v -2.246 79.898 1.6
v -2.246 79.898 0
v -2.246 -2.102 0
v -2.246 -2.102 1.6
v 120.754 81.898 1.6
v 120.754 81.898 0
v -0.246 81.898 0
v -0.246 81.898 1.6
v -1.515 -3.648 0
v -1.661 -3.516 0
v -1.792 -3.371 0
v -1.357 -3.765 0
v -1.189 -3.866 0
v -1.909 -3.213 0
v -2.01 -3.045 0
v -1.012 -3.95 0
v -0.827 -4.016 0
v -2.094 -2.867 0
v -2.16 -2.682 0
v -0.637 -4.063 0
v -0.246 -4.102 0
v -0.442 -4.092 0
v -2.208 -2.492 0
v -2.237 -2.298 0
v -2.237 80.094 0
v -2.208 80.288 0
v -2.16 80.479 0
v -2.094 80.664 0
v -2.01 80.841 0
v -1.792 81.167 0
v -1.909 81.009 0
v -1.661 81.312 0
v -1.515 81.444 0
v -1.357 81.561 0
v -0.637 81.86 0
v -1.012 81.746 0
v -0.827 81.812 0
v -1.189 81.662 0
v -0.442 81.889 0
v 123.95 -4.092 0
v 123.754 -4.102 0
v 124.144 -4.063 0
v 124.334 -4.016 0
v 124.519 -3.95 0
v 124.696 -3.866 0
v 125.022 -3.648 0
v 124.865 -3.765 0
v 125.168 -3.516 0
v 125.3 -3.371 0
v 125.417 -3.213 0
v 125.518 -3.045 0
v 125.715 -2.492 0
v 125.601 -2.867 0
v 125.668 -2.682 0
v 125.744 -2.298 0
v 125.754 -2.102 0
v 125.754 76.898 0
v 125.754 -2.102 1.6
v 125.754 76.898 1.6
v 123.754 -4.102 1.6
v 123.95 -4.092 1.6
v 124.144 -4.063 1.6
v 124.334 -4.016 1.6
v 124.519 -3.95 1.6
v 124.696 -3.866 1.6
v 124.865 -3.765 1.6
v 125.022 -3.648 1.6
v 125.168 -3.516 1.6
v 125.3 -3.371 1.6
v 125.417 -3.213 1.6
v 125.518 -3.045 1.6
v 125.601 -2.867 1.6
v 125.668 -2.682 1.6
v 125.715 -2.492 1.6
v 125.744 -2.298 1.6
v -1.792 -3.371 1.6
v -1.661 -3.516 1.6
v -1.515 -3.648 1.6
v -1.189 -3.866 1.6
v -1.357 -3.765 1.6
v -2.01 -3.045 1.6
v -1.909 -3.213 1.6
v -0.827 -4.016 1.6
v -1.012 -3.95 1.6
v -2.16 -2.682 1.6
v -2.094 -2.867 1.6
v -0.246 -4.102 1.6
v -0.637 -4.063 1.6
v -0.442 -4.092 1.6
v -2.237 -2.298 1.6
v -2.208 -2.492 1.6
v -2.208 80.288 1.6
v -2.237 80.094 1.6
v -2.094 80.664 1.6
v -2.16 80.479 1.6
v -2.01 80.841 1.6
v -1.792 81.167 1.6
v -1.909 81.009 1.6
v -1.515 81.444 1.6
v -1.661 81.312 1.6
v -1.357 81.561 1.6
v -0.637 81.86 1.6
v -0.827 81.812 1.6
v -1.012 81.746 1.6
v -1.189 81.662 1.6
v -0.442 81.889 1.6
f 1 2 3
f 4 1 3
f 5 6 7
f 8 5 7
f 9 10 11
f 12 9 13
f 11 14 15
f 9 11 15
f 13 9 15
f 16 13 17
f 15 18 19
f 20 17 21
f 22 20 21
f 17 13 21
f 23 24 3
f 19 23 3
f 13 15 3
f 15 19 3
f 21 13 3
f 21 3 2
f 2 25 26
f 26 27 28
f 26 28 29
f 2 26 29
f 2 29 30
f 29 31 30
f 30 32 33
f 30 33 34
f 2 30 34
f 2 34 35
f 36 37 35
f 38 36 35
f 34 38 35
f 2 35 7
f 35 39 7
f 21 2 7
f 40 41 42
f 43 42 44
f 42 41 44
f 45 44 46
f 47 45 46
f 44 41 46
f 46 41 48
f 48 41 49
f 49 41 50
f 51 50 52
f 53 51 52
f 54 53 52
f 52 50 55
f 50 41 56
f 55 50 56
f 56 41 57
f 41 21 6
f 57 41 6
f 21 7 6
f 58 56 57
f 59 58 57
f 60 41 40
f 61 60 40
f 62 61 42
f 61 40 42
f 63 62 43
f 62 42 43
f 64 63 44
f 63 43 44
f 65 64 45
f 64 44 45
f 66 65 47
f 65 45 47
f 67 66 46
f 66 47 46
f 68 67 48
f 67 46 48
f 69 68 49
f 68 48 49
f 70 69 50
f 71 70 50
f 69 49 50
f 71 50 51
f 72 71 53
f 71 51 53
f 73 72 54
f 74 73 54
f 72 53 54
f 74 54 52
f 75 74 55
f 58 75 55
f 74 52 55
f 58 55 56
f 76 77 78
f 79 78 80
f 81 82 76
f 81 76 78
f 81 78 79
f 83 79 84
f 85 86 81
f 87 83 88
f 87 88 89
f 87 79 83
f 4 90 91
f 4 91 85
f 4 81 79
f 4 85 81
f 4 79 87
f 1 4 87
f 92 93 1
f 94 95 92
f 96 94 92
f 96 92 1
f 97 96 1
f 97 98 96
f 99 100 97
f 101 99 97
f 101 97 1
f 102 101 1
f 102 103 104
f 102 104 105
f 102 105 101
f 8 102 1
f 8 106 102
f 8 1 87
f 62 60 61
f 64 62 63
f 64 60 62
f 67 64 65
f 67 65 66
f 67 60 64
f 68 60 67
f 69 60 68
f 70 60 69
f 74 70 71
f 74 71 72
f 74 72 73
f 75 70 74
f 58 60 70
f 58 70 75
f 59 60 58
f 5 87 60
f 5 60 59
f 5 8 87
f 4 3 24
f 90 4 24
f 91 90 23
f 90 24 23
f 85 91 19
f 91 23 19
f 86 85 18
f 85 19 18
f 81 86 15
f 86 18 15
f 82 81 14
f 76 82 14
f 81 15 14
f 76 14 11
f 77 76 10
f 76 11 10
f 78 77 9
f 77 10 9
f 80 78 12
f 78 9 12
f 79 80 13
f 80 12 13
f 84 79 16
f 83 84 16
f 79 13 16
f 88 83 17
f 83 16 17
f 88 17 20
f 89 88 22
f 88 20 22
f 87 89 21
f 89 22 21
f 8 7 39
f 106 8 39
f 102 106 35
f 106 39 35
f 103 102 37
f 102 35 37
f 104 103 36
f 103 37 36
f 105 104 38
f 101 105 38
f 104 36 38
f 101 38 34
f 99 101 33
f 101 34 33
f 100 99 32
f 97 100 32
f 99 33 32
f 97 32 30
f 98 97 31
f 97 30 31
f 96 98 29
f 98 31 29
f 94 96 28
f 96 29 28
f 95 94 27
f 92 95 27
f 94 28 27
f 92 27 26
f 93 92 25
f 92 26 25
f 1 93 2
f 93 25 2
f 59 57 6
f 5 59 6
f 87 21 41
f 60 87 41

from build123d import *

# Parameters (mm, degrees)
BOSS_EXTRUDE1_DEPTH = 1.6


with BuildPart() as part:
    # Sketch1 → Boss-Extrude1 (new body)
    with BuildSketch(Plane.XY):
        with BuildLine():
            Line((-2.246334873, 79.89819124), (-2.246334873, -2.101808758))
            ThreePointArc((-2.246334873, -2.101808758), (-1.660548435, -3.516022321), (-0.246334873, -4.101808758))
            Line((-0.246334873, -4.101808758), (123.753665128, -4.101808758))
            ThreePointArc((123.753665128, -4.101808758), (125.16787869, -3.516022321), (125.753665128, -2.101808758))
            Line((125.753665128, -2.101808758), (125.753665128, 76.89819124))
            Line((125.753665128, 76.89819124), (120.753665128, 81.89819124))
            Line((120.753665128, 81.89819124), (-0.246334873, 81.89819124))
            ThreePointArc((-0.246334873, 81.89819124), (-1.660548435, 81.312404802), (-2.246334873, 79.89819124))
        make_face()
    extrude(amount=BOSS_EXTRUDE1_DEPTH)


solid = part.part
